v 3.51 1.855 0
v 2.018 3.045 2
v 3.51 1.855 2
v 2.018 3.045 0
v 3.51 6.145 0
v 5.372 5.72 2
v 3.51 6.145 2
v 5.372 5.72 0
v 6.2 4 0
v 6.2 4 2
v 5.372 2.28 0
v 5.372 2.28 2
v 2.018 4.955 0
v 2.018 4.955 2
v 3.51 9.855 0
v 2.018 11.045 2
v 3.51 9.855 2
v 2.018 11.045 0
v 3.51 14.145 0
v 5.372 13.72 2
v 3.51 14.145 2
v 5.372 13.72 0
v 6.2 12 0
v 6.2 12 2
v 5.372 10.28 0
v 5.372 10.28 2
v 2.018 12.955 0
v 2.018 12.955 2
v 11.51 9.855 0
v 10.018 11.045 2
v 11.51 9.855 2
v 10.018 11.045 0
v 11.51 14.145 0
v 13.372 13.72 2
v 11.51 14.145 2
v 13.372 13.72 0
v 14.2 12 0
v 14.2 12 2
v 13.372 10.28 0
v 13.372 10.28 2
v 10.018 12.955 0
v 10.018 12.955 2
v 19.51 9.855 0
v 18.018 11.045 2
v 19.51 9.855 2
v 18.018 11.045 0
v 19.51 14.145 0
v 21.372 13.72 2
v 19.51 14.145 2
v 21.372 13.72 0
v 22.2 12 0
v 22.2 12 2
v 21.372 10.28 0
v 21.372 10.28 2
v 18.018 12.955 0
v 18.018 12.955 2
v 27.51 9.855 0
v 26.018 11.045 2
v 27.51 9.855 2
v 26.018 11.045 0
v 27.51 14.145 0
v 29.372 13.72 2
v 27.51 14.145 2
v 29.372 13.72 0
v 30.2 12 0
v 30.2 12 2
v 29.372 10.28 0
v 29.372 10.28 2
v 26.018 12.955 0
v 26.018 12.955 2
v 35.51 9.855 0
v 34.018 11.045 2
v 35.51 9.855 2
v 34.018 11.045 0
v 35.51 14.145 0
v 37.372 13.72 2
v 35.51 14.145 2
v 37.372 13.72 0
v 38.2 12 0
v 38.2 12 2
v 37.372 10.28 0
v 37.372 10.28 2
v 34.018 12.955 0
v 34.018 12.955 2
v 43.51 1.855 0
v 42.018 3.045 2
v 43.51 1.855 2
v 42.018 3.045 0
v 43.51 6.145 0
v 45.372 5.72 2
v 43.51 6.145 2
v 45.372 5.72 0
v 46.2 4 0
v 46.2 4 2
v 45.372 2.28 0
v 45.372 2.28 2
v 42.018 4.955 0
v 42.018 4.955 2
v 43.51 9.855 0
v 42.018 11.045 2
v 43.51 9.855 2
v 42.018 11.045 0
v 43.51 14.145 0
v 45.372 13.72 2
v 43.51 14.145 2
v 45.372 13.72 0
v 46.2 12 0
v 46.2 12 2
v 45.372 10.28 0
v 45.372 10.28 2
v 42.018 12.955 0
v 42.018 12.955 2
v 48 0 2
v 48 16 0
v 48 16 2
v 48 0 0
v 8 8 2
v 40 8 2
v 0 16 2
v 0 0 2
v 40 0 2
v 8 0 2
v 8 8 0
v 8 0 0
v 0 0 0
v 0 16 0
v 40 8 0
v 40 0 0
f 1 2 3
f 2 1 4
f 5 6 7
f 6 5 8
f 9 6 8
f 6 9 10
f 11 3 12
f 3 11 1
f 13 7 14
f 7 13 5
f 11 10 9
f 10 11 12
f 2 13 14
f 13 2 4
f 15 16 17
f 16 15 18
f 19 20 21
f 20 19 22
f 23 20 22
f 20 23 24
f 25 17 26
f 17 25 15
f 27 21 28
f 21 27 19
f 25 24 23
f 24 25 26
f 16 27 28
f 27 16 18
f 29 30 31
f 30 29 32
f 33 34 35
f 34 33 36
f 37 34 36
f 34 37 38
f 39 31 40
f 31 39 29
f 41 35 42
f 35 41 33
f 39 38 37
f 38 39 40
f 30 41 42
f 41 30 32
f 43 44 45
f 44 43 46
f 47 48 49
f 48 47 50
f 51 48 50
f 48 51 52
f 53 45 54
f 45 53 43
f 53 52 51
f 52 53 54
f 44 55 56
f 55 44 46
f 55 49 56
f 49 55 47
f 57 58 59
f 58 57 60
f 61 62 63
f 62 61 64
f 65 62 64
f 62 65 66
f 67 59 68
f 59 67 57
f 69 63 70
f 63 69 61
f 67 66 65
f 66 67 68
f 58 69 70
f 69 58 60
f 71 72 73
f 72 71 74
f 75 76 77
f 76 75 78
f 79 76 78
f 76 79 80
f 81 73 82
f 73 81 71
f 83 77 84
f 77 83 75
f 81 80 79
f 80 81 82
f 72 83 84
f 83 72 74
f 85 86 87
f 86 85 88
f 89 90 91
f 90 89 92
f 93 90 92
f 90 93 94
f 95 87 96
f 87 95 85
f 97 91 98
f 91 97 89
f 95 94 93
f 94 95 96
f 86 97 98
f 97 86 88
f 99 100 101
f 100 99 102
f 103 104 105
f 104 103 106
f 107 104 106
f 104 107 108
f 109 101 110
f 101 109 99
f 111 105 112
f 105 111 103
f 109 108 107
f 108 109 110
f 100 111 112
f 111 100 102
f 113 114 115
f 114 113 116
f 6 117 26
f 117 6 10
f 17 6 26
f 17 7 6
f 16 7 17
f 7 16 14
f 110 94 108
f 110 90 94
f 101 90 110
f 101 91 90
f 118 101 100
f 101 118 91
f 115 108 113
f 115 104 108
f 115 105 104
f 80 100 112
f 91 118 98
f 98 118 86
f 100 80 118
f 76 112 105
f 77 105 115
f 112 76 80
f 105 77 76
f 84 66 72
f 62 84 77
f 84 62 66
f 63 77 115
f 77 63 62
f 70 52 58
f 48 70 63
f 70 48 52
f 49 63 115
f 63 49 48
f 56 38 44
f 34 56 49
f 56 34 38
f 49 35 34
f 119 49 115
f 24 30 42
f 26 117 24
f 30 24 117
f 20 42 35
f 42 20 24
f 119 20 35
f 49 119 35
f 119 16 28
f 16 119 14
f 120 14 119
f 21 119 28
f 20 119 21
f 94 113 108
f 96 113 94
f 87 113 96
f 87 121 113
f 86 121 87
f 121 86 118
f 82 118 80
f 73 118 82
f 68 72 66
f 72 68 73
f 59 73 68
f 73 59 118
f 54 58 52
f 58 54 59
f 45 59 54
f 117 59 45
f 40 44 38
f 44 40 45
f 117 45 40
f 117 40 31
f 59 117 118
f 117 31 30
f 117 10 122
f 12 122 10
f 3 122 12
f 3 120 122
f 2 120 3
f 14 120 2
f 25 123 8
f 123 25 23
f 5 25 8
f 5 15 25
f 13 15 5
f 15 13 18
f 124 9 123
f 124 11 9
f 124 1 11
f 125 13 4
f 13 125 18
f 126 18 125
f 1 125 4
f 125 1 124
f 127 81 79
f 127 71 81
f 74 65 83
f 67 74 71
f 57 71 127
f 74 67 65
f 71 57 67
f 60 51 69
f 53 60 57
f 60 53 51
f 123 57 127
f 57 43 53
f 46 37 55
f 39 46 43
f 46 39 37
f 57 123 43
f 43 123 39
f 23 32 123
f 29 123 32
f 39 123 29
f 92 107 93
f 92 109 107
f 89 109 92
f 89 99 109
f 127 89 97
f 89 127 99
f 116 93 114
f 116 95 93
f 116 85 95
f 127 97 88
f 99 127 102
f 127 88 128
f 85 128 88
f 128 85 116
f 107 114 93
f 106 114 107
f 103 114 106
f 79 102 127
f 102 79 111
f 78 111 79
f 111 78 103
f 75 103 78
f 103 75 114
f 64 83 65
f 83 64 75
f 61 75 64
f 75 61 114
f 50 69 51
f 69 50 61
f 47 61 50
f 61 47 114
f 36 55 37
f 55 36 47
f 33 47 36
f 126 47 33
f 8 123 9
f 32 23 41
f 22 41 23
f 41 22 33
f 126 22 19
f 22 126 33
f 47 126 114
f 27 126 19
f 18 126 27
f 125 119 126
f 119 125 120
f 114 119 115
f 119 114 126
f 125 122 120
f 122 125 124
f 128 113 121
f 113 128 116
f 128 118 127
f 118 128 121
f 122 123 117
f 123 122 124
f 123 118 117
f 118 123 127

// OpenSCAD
// configuration
space = 4;
hole = 4;
pad = space / 2;

length = 6;
width = 2;
thickness = pad;

// internal
l = length*hole + (length-1)*space + 2*pad;
w = width*hole + (width-1)*space + 2*pad;
sl = (length-2)*hole + (length-3)*space + 2*pad;
sw = (width-1)*hole + (width-2)*space + 2*pad;

// design
difference(){
    cube([
        l,
        w,
        thickness
    ]);

    for(i = [0:length-1]){
        for(j=[0: width-1]){
            translate([
                i * (space + hole) + pad + hole/2,
                j * (space + hole) + pad + hole/2,
                -thickness])
            {
                cylinder(
                    h = thickness * 3,
                    r= hole/2 + 0.2);
                }
            }
        }

    translate([
        pad + hole + space/2,
        -pad,
        -pad
    ]) {
        cube([sl, sw+pad, 3*thickness]);
    }
}
